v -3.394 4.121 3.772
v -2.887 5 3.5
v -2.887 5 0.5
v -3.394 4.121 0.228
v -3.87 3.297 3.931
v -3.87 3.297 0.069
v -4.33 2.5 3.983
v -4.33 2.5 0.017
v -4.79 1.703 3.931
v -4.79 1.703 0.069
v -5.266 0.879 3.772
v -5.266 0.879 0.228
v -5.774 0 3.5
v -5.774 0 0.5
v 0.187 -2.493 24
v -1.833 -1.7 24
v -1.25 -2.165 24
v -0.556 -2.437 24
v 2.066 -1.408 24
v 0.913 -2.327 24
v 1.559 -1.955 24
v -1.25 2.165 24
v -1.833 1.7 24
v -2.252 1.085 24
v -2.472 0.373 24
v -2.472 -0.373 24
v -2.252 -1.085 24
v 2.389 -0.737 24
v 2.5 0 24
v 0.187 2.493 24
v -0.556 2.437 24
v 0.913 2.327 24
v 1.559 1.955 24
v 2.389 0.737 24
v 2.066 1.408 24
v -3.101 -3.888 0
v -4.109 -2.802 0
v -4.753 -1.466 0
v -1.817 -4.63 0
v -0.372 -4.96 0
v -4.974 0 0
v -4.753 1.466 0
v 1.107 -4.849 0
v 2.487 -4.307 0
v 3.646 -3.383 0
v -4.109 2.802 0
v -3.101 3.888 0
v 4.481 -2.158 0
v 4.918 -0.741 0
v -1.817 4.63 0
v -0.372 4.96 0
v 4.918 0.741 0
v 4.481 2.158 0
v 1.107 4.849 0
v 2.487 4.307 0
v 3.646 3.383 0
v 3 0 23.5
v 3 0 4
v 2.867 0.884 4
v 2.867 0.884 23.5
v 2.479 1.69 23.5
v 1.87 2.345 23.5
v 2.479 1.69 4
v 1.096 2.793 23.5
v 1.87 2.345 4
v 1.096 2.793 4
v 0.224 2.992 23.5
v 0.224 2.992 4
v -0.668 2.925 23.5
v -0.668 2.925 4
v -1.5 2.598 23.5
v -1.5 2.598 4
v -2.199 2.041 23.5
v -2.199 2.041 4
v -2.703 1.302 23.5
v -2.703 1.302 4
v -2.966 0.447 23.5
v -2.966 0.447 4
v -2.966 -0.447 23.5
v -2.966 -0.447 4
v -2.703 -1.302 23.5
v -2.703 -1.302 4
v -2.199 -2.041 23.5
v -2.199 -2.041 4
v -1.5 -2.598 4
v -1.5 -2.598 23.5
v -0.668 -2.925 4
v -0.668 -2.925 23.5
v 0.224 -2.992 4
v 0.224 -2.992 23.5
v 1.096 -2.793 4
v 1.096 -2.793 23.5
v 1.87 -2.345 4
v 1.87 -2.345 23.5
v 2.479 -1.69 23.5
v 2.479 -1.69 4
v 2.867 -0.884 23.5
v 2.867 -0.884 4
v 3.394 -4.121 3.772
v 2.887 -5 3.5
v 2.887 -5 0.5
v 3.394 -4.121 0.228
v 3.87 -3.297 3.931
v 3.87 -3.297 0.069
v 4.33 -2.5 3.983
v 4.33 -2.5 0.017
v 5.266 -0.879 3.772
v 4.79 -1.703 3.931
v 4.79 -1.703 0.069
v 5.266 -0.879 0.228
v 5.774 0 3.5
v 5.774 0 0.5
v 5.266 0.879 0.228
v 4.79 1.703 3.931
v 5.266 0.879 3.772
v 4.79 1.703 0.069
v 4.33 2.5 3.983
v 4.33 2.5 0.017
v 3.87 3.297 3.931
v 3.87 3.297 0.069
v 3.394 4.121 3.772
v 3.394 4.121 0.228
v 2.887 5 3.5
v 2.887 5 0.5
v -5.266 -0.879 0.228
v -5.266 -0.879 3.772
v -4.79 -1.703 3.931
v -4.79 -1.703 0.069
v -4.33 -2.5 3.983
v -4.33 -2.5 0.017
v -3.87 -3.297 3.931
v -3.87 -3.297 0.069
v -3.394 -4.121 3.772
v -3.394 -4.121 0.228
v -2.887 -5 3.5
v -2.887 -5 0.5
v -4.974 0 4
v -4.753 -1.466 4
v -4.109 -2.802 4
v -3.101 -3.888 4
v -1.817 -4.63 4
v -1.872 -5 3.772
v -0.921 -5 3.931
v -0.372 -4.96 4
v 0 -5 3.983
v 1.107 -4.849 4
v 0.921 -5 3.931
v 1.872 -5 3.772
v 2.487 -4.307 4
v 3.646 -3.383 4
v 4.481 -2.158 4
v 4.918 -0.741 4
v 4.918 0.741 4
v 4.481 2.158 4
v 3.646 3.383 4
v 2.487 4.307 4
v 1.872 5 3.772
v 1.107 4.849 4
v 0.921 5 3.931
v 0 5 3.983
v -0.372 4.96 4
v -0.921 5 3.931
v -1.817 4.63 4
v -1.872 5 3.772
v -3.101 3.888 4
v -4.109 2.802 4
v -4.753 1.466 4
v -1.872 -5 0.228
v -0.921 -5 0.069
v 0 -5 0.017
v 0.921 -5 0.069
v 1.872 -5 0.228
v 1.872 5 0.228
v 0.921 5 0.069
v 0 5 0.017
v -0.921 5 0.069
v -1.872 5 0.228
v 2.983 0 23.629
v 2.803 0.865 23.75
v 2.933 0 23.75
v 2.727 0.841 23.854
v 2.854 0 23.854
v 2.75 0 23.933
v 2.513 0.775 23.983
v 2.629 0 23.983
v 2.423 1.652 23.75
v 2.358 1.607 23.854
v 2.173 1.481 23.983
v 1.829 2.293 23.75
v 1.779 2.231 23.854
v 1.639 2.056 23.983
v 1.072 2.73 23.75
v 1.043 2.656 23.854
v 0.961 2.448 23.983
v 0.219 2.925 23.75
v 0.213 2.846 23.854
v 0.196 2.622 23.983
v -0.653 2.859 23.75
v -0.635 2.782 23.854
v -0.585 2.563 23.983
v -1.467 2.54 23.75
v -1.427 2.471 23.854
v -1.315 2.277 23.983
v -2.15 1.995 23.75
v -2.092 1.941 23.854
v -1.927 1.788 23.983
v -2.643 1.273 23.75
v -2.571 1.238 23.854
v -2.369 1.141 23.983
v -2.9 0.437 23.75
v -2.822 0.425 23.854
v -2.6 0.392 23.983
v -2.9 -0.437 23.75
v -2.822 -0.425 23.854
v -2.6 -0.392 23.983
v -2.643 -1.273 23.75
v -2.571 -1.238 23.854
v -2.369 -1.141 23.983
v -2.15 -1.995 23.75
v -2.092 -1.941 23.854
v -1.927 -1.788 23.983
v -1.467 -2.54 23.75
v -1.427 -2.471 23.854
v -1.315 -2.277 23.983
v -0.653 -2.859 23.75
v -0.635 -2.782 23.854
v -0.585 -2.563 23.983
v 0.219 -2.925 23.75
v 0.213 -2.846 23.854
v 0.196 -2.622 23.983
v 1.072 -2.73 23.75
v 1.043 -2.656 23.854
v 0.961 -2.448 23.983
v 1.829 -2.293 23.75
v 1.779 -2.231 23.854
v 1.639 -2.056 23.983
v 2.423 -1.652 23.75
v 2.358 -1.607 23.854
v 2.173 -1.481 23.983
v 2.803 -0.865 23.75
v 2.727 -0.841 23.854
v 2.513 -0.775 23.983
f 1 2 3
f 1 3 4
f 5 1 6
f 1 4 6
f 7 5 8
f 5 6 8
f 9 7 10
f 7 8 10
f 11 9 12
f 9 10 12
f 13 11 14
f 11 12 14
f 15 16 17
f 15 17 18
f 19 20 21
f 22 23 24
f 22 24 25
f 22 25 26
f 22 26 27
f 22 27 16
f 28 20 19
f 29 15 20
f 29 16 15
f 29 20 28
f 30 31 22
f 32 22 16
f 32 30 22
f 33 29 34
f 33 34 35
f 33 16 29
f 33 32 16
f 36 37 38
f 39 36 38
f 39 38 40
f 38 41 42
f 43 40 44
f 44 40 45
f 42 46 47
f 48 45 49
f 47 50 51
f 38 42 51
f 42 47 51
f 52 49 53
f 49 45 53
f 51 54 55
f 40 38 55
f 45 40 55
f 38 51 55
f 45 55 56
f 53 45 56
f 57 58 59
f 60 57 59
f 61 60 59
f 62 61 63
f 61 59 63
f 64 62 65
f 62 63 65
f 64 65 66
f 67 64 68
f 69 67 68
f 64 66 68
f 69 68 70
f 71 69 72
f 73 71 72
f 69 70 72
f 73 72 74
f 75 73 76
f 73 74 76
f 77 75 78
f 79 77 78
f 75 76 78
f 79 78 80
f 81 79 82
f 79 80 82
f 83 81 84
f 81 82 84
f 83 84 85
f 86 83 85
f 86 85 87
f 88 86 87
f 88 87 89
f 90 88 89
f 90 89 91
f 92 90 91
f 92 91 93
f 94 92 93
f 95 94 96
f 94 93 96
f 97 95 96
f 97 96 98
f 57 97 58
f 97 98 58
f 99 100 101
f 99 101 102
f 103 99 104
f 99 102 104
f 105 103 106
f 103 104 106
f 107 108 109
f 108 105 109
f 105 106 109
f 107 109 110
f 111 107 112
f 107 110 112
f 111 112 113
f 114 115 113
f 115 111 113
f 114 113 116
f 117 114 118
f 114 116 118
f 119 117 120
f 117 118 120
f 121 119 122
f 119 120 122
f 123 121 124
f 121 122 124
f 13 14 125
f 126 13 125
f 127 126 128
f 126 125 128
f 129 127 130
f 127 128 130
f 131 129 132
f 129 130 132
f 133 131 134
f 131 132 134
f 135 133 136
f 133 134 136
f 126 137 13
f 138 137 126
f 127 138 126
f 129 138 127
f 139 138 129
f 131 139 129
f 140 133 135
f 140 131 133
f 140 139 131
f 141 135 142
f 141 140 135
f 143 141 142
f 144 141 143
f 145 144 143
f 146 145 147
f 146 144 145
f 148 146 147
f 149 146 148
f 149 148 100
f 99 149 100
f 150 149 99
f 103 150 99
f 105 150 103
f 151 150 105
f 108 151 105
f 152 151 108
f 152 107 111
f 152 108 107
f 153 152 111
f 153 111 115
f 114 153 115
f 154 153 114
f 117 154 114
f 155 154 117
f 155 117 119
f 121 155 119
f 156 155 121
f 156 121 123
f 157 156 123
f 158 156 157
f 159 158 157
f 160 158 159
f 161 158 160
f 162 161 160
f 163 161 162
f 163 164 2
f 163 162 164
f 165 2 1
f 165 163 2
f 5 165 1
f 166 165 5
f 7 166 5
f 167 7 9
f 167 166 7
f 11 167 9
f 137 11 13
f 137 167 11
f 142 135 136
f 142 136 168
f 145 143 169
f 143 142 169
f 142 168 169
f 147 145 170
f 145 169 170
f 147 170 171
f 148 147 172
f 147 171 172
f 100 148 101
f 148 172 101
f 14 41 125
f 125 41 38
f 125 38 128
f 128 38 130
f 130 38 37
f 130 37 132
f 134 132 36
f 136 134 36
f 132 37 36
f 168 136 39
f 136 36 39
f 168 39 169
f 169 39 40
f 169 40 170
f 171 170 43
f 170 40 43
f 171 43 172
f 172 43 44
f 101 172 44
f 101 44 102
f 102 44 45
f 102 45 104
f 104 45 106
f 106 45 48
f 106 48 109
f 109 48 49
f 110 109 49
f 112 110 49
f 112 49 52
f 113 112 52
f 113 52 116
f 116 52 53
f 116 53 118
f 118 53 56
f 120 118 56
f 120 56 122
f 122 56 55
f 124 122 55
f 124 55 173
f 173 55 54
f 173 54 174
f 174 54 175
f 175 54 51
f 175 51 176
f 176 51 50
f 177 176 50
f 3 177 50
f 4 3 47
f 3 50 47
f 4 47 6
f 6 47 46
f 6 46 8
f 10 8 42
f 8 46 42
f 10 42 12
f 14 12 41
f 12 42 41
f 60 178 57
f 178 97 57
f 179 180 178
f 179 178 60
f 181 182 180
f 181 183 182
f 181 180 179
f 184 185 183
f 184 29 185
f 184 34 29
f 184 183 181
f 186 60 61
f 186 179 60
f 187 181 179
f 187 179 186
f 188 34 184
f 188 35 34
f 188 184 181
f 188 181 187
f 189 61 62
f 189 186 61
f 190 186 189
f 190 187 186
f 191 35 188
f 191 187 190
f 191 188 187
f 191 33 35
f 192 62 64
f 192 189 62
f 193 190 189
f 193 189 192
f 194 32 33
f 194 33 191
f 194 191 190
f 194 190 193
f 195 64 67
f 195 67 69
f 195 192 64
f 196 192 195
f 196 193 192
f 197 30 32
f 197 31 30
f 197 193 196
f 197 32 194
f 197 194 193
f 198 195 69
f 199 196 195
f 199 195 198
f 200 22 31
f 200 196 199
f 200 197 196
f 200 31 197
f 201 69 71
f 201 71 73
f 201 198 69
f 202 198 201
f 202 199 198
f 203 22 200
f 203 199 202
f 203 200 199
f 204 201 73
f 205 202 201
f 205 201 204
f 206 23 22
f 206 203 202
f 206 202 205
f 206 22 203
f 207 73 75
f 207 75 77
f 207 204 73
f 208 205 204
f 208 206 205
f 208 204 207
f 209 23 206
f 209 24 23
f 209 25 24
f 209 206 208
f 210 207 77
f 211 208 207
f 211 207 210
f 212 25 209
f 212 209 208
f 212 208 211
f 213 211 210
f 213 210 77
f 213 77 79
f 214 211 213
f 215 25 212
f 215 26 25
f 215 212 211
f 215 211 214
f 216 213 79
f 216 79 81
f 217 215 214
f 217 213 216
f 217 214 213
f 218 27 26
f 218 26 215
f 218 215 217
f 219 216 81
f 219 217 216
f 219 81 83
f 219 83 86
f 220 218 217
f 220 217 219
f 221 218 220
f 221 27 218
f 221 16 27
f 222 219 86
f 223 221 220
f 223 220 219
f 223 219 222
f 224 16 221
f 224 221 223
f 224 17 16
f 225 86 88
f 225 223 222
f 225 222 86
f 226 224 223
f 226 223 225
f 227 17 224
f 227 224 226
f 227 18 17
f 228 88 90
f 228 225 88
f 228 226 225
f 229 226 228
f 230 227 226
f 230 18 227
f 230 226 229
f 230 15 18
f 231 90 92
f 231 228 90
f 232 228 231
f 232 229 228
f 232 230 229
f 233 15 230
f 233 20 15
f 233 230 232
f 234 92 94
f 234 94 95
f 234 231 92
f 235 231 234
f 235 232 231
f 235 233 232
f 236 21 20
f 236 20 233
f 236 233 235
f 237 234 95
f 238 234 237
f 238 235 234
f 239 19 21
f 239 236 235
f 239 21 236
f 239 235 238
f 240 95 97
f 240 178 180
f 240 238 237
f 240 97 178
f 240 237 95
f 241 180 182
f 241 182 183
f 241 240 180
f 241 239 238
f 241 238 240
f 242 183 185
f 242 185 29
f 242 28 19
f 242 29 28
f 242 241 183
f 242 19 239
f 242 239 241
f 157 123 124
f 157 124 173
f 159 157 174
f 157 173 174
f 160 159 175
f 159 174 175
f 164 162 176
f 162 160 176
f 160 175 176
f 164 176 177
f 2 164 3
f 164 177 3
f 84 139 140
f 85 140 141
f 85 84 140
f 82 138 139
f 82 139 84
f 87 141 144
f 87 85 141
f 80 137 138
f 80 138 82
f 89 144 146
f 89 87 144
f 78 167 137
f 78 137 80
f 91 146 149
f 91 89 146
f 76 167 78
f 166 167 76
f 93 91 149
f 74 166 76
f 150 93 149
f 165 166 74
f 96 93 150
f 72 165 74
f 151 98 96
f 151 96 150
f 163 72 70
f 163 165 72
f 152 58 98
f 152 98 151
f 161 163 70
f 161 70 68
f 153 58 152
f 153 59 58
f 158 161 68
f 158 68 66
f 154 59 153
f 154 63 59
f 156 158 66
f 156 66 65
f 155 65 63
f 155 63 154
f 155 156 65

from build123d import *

# Parameters (mm, degrees)
Y_KSEKLIK_EKSTR_ZYON1_DEPTH = 4
IZIM3_R                     = 3
Y_KSEKLIK_EKSTR_ZYON2_DEPTH = 20
RADYUS1_R                   = 0.5


with BuildPart() as part:
    # Çizim1 → Yükseklik-Ekstrüzyon1 (new body)
    with BuildSketch(Plane.XY):
        Polygon((5.773502692, 0), (2.886751346, 5), (-2.886751346, 5), (-5.773502692, 0), (-2.886751346, -5), (2.886751346, -5), align=None)
    extrude(amount=Y_KSEKLIK_EKSTR_ZYON1_DEPTH)

    # Çizim2 → Kes-Döndür1 (revolve, cut)
    with BuildSketch(Plane(origin=(0, 0, 0), x_dir=(1, 0, 0), z_dir=(0, 1, 0))):
        Polygon((-5.773502692, 0), (-5.773502692, -0.5), (-4.973502692, 0), align=None)
        Polygon((-5.773502692, -4), (-5.773502692, -3.5), (-4.973502692, -4), align=None)
    revolve(axis=Axis((0, 0, 0), (0, 0, 1)), mode=Mode.SUBTRACT)

    # Çizim3 → Yükseklik-Ekstrüzyon2 (add)
    with BuildSketch(Plane.XY.offset(4)):
        Circle(IZIM3_R)
    extrude(amount=Y_KSEKLIK_EKSTR_ZYON2_DEPTH)

    # Radyus1
    radyus1_edges = [part.edges().sort_by_distance(p)[0] for p in [
        (-3, 0, 24),
    ]]
    fillet(radyus1_edges, radius=RADYUS1_R)


solid = part.part
